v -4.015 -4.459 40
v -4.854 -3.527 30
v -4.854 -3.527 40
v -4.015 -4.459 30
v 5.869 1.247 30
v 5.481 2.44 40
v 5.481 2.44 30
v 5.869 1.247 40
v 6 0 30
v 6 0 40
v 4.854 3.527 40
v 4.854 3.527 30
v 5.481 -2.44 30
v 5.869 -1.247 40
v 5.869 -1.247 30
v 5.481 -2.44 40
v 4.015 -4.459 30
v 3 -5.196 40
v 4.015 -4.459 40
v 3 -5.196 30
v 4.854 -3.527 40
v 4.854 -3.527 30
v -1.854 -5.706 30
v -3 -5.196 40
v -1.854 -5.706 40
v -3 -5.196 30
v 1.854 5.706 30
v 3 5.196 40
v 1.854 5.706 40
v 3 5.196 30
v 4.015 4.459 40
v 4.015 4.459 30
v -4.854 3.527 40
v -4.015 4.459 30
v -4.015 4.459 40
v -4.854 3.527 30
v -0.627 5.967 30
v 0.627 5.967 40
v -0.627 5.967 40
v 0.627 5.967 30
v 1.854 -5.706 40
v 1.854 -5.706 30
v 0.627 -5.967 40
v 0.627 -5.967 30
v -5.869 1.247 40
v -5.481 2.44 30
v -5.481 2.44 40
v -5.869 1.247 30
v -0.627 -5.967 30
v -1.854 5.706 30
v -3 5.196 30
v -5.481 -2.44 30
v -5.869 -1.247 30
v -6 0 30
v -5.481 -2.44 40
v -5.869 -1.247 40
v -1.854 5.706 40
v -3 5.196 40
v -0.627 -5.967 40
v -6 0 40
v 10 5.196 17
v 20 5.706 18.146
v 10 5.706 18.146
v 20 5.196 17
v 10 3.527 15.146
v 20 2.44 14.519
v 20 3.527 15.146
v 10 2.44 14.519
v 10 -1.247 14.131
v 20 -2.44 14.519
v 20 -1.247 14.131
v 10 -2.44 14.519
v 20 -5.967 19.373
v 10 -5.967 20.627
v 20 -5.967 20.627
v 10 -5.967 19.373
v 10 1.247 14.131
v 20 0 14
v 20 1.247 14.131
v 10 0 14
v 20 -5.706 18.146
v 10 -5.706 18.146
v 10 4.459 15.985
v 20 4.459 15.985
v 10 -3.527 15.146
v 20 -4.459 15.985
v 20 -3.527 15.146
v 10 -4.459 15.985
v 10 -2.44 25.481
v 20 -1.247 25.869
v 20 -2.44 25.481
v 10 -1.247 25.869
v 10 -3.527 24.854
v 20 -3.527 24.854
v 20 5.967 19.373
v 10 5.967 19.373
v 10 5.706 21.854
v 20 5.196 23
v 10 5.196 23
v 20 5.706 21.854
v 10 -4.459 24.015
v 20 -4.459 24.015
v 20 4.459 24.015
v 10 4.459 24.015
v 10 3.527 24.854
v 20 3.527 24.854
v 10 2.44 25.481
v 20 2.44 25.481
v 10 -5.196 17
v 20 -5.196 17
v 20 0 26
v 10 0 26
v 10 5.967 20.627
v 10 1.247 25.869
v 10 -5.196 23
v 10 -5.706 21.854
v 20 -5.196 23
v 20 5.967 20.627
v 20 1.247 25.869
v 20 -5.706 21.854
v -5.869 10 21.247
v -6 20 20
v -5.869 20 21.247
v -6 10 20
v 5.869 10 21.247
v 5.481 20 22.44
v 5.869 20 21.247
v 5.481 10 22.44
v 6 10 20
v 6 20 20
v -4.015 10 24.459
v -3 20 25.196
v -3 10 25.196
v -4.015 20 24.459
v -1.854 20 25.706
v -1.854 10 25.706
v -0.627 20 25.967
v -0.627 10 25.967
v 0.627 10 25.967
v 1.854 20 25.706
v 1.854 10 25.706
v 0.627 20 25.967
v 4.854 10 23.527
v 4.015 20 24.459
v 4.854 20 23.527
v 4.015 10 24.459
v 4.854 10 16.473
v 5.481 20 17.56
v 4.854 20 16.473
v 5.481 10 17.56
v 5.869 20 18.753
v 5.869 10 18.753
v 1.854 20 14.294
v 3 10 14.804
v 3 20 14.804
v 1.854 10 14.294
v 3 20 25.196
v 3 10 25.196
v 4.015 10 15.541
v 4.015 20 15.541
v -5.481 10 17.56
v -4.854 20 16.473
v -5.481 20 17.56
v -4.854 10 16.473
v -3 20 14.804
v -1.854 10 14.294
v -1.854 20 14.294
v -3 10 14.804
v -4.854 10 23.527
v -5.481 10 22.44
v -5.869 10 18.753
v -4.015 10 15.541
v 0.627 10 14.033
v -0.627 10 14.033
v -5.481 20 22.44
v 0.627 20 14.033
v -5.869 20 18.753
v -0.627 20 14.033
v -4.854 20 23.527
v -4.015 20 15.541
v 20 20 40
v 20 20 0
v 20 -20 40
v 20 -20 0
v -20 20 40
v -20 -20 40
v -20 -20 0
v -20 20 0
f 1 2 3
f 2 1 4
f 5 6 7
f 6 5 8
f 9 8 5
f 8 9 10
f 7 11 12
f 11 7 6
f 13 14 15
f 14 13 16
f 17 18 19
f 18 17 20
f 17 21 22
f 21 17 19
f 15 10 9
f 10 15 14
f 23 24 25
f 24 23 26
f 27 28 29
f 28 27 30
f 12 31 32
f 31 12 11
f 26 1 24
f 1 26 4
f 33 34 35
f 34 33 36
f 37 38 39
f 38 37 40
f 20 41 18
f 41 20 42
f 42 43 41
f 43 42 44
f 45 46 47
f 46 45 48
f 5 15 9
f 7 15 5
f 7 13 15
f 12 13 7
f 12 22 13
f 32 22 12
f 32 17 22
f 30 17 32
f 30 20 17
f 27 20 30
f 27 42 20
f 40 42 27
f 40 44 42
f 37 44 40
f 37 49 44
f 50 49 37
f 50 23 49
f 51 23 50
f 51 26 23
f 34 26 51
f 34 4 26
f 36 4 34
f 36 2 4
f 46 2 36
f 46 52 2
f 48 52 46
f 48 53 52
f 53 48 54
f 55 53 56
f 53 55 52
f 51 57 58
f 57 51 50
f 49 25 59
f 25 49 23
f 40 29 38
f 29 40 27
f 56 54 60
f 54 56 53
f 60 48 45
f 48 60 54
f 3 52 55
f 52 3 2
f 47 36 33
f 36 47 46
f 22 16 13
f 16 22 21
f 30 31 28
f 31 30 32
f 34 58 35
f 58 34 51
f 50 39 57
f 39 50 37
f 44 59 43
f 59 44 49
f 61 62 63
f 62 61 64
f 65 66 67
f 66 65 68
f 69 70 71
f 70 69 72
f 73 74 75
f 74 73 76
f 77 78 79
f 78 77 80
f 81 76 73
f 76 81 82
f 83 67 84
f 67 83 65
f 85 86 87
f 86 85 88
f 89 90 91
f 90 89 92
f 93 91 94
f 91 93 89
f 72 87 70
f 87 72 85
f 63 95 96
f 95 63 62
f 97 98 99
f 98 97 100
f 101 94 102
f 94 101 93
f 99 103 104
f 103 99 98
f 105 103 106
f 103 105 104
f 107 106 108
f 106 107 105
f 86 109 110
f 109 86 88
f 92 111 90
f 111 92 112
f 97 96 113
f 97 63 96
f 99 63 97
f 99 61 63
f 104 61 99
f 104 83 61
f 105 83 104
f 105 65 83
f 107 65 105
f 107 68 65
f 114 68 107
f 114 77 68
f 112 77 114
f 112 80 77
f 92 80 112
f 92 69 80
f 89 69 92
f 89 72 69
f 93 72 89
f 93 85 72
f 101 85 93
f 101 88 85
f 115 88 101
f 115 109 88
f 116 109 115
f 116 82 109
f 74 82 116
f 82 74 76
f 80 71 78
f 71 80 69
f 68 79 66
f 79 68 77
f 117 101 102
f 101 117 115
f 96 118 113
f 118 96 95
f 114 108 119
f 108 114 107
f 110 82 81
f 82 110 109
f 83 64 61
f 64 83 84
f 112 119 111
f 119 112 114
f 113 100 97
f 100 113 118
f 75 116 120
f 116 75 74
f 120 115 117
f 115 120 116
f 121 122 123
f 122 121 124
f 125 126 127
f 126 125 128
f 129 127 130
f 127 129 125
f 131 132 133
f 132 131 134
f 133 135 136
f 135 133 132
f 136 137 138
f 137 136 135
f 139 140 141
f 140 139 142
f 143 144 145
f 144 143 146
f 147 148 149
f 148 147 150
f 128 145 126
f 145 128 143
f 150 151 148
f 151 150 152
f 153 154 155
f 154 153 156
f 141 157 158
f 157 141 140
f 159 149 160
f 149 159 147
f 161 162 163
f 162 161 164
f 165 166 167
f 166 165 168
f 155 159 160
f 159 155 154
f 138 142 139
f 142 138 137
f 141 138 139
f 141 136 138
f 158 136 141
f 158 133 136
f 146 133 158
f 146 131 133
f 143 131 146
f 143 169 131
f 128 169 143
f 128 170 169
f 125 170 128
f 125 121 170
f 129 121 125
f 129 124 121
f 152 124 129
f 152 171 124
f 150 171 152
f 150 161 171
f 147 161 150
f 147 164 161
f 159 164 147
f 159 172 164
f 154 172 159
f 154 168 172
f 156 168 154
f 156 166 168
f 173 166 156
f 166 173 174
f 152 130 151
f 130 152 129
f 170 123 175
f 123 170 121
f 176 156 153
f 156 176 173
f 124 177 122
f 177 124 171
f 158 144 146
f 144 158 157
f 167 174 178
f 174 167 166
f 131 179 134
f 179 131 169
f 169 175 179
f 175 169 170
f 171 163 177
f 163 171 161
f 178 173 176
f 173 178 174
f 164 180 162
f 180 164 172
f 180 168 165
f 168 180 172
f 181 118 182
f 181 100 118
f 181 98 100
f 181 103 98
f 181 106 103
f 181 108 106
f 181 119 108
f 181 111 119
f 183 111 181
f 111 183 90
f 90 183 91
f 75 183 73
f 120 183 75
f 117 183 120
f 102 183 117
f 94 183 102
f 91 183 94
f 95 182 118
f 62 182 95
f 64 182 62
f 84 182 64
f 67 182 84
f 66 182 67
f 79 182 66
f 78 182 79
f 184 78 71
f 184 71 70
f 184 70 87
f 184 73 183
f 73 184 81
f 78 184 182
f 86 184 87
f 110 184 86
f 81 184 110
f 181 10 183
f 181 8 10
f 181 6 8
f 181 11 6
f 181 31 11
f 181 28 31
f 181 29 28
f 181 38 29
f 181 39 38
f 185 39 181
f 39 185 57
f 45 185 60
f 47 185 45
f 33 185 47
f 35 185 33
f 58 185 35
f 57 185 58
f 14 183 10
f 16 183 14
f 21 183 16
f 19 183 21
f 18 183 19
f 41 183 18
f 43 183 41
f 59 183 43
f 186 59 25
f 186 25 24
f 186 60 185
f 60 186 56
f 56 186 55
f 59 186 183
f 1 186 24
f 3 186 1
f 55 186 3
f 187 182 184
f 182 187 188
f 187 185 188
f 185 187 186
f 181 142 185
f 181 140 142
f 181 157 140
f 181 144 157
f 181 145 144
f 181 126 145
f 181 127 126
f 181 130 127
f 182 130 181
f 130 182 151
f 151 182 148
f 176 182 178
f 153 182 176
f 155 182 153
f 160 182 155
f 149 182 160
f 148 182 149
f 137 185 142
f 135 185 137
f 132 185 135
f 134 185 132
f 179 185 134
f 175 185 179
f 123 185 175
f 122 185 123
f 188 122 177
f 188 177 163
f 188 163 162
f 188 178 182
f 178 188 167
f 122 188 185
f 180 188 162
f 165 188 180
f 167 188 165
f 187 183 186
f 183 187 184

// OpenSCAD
part = "Inner"; //[Inner:Cube, Outer: Doubling Part]

//Side length of the small cube (mm)
side_length=40;

//Magnet's diameter
diameter_of_the_magnets = 6; // [2.5:5 mm, 3:6 mm, 3.5:7 mm, 4:8 mm, 4.5:9 mm, 5: 10 mm]


//Magnet's height
height_of_the_magnets=10; // [2:2 mm, 3:3 mm, 4:4 mm, 5:5 mm, 6:6 mm]

b=side_length/2;


module smaller() {
translate ([0,0,b]) {
cube(side_length, center=true);
    }
}
module smallerLast () {
difference () {
    smaller();
    magnetHole();
    }
}
module topPart () {
    translate ([(c-side_length)/2,(c-side_length)/2,c/2]) {cube(c, center=true);
    cube(side_length, center=true);
    }
    }
    
c=pow(2*side_length*side_length*side_length,1/3);
module volumeTop () { difference () {
    topPart();
    smaller();
}
}
module topLast() {
difference () {
volumeTop();
magnetHole();
}
}

module magnetHole() {
translate([0,0,side_length-height_of_the_magnets]) {
    cylinder(r=diameter_of_the_magnets, h=2*height_of_the_magnets, $fn=30);
}

rotate(a=90, v=[0,1,0]) {translate([-side_length/2 ,0,b-height_of_the_magnets]) {
    cylinder(r=diameter_of_the_magnets, h=2*height_of_the_magnets, $fn=30);
}
}

rotate(a=90, v=[1,0,0]) {translate([0 ,side_length/2,-b-height_of_the_magnets]) {
    cylinder(r=diameter_of_the_magnets, h=2*height_of_the_magnets, $fn=30);
}
}
}

print_part();

module print_part()
{
	if (part == "Inner")
	{
		smallerLast();
	}
	else if (part == "Outer")
	{
		topLast();
	}
	
}
